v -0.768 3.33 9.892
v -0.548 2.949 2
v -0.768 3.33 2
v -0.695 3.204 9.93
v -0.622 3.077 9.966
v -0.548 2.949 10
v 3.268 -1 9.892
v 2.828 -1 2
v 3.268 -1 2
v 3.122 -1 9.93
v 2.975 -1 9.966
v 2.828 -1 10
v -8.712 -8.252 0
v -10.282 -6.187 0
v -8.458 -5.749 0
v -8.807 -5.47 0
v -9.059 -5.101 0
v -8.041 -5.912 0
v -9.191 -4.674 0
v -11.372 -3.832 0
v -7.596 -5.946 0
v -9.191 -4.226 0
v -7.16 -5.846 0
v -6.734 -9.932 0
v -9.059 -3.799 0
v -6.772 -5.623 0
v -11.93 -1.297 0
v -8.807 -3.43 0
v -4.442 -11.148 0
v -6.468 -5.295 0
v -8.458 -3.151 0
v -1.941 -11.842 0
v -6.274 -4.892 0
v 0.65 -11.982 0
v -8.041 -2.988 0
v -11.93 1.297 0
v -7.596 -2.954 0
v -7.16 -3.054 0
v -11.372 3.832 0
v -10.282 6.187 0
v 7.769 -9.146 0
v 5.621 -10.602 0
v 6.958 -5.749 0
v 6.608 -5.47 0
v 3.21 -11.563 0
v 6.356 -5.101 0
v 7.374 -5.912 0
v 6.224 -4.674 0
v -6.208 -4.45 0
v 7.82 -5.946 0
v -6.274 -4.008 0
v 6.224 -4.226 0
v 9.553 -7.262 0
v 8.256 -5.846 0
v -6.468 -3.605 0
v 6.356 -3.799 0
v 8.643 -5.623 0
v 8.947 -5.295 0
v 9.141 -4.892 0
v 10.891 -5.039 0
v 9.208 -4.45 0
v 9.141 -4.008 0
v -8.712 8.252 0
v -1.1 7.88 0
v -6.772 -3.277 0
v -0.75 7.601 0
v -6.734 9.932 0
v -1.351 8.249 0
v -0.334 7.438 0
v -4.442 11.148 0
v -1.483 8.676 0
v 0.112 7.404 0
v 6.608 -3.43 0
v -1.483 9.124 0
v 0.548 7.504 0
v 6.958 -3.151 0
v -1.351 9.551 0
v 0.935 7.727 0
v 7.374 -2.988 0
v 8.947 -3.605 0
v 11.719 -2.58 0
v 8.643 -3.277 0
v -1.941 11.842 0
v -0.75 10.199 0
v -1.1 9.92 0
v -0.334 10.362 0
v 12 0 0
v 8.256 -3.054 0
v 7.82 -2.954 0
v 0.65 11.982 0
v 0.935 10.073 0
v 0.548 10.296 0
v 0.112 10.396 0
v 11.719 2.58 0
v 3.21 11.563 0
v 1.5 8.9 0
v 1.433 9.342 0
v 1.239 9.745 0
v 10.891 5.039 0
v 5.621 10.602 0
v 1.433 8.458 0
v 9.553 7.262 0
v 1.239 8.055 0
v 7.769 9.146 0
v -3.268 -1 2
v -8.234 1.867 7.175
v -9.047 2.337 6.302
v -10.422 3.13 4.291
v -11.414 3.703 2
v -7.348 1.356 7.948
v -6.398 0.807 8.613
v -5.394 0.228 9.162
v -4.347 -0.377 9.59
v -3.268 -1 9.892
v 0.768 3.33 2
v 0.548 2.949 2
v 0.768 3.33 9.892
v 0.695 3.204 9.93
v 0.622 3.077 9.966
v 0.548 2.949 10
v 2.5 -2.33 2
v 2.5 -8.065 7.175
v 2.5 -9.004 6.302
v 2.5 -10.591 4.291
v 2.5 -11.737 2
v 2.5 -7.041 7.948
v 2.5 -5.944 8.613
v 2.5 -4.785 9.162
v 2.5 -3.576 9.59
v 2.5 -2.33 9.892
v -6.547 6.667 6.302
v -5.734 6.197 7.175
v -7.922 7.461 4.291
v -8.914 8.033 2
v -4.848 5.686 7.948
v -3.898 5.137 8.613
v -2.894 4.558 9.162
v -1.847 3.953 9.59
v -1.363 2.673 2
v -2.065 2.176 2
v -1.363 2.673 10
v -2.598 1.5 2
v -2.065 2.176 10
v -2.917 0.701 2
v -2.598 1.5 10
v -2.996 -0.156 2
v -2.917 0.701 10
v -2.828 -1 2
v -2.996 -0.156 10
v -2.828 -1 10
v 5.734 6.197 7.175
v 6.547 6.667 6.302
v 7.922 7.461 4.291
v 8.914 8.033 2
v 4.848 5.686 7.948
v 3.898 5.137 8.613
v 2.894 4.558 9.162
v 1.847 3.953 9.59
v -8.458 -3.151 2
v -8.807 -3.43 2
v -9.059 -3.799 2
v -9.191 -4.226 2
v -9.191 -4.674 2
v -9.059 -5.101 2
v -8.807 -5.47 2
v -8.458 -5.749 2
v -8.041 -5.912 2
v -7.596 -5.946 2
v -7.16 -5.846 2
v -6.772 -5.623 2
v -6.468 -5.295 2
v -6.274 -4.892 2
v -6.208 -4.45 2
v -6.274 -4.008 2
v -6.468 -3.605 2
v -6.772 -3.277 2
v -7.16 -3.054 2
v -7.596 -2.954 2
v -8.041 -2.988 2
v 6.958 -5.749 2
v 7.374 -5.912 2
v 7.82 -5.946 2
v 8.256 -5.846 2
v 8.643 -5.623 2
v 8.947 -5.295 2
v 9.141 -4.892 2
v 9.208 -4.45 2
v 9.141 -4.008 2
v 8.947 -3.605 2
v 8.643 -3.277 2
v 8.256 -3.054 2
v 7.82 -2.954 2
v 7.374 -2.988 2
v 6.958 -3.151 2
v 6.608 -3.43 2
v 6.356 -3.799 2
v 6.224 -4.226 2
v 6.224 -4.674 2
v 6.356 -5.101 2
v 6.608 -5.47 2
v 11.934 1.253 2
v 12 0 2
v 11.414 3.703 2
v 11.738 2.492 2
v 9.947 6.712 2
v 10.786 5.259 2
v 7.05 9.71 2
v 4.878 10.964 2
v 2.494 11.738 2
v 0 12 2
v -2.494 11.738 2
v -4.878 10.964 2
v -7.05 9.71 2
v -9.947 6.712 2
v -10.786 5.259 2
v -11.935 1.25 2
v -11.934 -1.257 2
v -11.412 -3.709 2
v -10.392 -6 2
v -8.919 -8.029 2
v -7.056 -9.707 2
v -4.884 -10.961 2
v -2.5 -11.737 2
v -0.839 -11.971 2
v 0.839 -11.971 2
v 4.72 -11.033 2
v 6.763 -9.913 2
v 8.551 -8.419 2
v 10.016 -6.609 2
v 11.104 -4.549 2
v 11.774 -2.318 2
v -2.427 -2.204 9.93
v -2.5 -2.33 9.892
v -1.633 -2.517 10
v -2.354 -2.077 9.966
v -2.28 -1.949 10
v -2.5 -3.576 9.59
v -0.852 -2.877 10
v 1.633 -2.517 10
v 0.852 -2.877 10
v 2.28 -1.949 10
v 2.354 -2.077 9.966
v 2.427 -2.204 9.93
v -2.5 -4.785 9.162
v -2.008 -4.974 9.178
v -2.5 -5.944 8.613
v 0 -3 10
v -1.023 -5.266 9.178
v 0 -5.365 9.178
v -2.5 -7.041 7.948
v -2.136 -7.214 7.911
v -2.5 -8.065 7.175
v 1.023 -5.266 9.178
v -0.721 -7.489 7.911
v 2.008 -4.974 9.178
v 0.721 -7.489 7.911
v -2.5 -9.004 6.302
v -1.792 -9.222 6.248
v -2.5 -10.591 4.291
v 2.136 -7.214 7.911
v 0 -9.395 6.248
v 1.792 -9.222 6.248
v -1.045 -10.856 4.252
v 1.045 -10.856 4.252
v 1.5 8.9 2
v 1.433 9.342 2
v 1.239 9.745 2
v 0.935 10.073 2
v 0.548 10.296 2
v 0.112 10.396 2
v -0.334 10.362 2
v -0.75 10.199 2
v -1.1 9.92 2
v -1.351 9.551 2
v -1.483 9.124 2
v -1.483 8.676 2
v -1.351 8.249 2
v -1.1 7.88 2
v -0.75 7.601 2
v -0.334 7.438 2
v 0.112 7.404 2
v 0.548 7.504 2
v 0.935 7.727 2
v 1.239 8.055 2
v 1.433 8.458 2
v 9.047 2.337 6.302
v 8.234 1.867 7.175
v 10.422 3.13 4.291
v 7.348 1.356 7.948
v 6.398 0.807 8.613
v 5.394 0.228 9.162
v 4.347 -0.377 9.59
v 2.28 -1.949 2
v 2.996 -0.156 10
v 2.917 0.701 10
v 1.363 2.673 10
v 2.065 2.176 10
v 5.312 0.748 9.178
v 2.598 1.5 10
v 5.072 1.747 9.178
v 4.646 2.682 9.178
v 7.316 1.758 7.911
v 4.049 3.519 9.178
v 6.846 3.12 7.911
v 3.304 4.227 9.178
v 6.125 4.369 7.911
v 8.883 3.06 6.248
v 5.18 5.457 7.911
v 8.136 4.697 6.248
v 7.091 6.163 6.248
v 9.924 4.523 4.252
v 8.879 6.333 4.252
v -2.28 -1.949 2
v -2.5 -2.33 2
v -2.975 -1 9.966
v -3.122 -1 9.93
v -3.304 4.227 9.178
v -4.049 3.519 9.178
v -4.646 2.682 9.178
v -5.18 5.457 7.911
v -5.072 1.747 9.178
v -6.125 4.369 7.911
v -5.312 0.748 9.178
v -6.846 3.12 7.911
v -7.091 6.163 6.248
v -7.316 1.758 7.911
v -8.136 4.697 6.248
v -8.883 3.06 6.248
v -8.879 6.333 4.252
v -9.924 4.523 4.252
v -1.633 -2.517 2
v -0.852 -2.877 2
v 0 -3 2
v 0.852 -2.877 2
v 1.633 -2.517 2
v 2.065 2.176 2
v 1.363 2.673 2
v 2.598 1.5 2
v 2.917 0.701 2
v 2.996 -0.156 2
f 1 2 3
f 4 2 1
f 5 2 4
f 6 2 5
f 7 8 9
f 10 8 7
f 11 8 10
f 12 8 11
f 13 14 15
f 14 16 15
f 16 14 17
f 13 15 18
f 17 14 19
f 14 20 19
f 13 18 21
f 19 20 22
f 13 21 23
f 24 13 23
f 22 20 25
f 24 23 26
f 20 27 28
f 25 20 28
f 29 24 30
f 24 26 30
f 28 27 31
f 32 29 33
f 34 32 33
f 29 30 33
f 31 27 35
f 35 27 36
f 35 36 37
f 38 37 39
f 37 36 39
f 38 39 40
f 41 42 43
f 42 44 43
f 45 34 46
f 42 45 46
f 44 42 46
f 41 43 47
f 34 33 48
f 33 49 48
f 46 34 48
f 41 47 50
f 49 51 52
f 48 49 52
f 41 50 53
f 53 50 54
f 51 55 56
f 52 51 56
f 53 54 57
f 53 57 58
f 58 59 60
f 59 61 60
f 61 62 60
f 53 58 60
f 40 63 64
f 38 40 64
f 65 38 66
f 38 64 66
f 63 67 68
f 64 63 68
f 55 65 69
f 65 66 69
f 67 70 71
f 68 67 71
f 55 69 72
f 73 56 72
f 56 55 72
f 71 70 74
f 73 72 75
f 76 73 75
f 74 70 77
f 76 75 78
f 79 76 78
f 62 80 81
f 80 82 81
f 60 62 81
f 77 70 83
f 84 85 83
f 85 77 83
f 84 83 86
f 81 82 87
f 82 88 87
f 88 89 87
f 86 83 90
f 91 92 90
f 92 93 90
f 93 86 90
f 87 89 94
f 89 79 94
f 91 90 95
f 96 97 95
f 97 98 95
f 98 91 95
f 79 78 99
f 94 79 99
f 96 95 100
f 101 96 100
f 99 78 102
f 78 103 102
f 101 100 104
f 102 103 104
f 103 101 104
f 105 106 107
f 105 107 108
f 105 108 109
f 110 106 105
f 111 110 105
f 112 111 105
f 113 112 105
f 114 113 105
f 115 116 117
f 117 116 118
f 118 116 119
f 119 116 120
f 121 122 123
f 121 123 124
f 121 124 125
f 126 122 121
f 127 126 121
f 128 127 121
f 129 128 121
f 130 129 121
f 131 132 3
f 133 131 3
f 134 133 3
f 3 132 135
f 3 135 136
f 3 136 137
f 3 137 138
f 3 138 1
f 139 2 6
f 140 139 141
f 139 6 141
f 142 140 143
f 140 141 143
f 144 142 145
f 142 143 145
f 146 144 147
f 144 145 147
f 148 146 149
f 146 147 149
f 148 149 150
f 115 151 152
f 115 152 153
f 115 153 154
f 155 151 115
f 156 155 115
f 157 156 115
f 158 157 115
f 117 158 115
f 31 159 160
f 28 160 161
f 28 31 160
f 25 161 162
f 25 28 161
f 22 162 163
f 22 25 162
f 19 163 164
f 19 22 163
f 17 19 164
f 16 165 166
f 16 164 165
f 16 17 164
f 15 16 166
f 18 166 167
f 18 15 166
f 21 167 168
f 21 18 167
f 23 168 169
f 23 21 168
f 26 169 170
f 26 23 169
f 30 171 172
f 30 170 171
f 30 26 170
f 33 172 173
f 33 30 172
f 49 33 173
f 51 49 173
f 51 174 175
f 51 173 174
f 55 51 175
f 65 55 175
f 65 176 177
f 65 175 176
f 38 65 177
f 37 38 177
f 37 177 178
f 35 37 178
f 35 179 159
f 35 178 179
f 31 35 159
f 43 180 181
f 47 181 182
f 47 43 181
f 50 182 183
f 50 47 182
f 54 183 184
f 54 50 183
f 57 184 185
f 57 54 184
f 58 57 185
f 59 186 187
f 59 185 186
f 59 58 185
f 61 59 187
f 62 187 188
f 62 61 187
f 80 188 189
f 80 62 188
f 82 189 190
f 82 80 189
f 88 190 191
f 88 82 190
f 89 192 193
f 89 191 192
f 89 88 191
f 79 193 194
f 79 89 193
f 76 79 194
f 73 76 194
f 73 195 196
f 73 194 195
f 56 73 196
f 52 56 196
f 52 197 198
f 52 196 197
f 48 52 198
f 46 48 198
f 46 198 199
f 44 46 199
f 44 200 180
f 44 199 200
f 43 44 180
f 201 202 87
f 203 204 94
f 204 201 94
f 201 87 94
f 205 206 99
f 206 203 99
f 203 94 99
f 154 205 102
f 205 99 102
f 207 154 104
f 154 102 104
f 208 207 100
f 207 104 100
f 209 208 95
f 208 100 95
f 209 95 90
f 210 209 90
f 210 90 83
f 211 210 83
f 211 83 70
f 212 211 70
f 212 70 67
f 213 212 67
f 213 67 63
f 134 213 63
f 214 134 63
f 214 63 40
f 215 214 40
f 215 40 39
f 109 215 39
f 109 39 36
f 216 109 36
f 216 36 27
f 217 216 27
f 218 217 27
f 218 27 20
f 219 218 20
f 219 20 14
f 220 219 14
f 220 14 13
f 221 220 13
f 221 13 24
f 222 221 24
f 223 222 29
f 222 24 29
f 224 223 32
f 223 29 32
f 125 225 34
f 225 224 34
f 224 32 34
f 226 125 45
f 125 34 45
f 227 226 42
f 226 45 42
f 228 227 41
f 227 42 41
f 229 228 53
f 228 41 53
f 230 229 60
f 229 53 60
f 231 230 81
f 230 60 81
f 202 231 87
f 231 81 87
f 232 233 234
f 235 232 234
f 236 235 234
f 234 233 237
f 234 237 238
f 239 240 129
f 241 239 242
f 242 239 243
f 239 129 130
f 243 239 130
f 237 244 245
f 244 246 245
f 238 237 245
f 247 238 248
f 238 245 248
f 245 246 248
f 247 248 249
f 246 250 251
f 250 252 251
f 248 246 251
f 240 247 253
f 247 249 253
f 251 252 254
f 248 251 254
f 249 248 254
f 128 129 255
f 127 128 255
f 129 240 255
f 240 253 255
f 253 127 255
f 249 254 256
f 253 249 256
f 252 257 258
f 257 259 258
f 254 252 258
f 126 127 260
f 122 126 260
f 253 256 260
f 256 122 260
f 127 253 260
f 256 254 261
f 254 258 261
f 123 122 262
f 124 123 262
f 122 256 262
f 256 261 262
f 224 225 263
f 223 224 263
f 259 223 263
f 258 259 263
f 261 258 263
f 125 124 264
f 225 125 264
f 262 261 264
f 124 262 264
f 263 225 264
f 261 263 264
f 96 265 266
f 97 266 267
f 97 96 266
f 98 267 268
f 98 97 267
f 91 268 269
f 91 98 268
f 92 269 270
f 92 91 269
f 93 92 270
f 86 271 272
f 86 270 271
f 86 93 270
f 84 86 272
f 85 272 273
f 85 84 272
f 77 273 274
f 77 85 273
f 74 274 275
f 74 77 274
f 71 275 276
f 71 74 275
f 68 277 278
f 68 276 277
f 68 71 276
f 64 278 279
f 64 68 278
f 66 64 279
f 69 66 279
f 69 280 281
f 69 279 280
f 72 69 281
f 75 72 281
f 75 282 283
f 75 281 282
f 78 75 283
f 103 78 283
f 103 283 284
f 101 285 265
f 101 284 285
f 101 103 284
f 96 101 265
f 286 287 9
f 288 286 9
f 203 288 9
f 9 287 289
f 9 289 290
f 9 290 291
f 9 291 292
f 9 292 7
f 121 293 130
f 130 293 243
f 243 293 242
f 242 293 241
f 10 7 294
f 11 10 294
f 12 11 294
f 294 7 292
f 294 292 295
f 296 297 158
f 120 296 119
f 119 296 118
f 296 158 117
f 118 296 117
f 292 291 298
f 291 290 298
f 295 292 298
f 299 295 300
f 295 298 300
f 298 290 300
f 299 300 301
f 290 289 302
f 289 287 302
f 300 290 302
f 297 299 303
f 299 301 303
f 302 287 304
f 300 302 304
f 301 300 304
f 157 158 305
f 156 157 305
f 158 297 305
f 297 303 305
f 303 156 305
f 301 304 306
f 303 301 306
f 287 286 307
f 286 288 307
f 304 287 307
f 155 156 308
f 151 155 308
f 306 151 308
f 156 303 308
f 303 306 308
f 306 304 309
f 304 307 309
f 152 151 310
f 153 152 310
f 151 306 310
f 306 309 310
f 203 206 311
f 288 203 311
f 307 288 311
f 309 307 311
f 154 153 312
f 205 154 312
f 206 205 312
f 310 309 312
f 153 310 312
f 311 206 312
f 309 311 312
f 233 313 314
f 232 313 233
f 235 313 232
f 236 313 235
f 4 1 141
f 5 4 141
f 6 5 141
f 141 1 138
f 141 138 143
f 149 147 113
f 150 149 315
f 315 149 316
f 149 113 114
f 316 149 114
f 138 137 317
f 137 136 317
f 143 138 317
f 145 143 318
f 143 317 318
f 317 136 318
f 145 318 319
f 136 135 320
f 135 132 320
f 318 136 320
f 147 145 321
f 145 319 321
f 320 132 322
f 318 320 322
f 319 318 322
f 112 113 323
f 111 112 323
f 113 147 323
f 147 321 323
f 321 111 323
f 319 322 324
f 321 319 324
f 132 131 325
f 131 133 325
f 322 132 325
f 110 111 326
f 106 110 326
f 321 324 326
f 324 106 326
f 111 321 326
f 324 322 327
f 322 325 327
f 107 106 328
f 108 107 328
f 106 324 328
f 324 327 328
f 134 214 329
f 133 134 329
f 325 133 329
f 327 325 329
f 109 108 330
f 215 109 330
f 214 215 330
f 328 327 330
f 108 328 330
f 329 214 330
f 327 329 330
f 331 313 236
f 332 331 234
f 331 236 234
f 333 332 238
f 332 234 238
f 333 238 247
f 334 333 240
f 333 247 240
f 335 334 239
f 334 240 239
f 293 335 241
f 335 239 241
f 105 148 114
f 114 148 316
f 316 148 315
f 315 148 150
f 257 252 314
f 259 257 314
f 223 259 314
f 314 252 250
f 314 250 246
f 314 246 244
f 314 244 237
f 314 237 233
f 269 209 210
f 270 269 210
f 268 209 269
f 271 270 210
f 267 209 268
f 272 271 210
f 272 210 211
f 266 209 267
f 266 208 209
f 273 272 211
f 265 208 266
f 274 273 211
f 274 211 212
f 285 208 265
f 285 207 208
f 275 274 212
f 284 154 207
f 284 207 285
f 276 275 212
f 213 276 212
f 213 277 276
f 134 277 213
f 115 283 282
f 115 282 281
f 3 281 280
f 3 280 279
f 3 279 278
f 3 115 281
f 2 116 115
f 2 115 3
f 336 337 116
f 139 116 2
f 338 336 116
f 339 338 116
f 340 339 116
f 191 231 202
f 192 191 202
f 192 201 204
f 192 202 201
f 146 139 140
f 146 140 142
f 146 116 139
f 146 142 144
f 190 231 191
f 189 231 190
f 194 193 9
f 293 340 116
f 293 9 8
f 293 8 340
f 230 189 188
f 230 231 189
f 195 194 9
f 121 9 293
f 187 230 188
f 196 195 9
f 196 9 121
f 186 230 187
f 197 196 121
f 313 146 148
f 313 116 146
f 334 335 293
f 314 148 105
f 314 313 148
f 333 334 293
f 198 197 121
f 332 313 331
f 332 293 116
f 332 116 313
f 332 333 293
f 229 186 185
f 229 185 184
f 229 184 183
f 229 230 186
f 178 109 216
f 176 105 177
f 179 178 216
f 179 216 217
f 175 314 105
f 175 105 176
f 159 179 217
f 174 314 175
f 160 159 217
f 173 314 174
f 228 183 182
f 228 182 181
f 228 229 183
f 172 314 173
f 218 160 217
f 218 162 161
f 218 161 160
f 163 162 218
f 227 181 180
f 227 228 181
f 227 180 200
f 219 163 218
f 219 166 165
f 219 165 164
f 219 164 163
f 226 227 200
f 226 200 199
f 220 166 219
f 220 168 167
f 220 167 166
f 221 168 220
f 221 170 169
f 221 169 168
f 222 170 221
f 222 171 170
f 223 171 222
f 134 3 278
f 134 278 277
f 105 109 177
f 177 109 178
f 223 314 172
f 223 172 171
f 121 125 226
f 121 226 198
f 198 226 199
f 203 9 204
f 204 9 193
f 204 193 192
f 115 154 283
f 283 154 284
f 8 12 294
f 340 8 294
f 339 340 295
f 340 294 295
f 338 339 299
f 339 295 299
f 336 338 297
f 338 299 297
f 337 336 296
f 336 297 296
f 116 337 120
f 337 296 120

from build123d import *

# Parameters (mm, degrees)
CYLINDER_R            = 12
CYLINDER_DEPTH        = 2
SKETCH_R              = 1.5
POCKET_DEPTH          = 5
POLARPATTERN_COUNT    = 3
REVOLUTION_ANGLE      = 360
BOX_W                 = 12
BOX_H                 = 11
BOX_DEPTH             = 11
BOX_MIRRORED_2_W      = 12
BOX_MIRRORED_2_H      = 11
BOX_MIRRORED_2_DEPTH  = 11
POLARPATTERN001_COUNT = 3


with BuildPart() as part:
    # Cylinder → Cylinder (join)
    with BuildSketch(Plane.XY):
        Circle(CYLINDER_R)
    extrude(amount=CYLINDER_DEPTH)

    # Sketch → Pocket (cut)
    with BuildSketch(Plane.XY):
        with Locations((0, 8.9)):
            Circle(SKETCH_R)
    pocket = extrude(amount=POCKET_DEPTH, mode=Mode.SUBTRACT)

    # PolarPattern: Pocket ×3 about axis
    polarpattern_axis = Axis((0, 0, 0), (0, 0, 1))
    for i in range(1, POLARPATTERN_COUNT):
        add(pocket.rotate(polarpattern_axis, i * 360 / POLARPATTERN_COUNT), mode=Mode.SUBTRACT)

    # Sketch001 → Revolution (revolve, symmetric)
    with BuildSketch(Plane.YZ) as revolution_sk:
        with BuildLine():
            Line((-12, 2), (-3, 2))
            Line((-3, 2), (-3, 10))
            ThreePointArc((-3, 10), (-8.5, 7.125), (-12, 2))
        make_face()
    revolve(axis=Axis((0, 0, 0), (0, 0, 1)), revolution_arc=REVOLUTION_ANGLE / 2)
    revolve(revolution_sk.sketch, axis=Axis((0, 0, 0), (0, 0, -1)), revolution_arc=REVOLUTION_ANGLE / 2)

    # Box → Box (cut)
    with BuildSketch(Plane(origin=(2.5, -13, 2), x_dir=(0, 1, 0), z_dir=(1, 0, 0))):
        with Locations((6, 5.5)):
            Rectangle(BOX_W, BOX_H)
    box = extrude(amount=BOX_DEPTH, mode=Mode.SUBTRACT)

    # Box Mirrored 2 → Box Mirrored 2 (cut)
    with BuildSketch(Plane(origin=(-2.5, -13, 2), x_dir=(0, 1, 0), z_dir=(1, 0, 0))):
        with Locations((6, 5.5)):
            Rectangle(BOX_MIRRORED_2_W, BOX_MIRRORED_2_H)
    box_mirrored_2 = extrude(amount=-BOX_MIRRORED_2_DEPTH, mode=Mode.SUBTRACT)

    # PolarPattern001: Box, Box Mirrored 2 ×3 about axis
    polarpattern001_axis = Axis((0, 0, 0), (0, 0, 1))
    for i in range(1, POLARPATTERN001_COUNT):
        add(box.rotate(polarpattern001_axis, i * 360 / POLARPATTERN001_COUNT), mode=Mode.SUBTRACT)
        add(box_mirrored_2.rotate(polarpattern001_axis, i * 360 / POLARPATTERN001_COUNT), mode=Mode.SUBTRACT)


solid = part.part
